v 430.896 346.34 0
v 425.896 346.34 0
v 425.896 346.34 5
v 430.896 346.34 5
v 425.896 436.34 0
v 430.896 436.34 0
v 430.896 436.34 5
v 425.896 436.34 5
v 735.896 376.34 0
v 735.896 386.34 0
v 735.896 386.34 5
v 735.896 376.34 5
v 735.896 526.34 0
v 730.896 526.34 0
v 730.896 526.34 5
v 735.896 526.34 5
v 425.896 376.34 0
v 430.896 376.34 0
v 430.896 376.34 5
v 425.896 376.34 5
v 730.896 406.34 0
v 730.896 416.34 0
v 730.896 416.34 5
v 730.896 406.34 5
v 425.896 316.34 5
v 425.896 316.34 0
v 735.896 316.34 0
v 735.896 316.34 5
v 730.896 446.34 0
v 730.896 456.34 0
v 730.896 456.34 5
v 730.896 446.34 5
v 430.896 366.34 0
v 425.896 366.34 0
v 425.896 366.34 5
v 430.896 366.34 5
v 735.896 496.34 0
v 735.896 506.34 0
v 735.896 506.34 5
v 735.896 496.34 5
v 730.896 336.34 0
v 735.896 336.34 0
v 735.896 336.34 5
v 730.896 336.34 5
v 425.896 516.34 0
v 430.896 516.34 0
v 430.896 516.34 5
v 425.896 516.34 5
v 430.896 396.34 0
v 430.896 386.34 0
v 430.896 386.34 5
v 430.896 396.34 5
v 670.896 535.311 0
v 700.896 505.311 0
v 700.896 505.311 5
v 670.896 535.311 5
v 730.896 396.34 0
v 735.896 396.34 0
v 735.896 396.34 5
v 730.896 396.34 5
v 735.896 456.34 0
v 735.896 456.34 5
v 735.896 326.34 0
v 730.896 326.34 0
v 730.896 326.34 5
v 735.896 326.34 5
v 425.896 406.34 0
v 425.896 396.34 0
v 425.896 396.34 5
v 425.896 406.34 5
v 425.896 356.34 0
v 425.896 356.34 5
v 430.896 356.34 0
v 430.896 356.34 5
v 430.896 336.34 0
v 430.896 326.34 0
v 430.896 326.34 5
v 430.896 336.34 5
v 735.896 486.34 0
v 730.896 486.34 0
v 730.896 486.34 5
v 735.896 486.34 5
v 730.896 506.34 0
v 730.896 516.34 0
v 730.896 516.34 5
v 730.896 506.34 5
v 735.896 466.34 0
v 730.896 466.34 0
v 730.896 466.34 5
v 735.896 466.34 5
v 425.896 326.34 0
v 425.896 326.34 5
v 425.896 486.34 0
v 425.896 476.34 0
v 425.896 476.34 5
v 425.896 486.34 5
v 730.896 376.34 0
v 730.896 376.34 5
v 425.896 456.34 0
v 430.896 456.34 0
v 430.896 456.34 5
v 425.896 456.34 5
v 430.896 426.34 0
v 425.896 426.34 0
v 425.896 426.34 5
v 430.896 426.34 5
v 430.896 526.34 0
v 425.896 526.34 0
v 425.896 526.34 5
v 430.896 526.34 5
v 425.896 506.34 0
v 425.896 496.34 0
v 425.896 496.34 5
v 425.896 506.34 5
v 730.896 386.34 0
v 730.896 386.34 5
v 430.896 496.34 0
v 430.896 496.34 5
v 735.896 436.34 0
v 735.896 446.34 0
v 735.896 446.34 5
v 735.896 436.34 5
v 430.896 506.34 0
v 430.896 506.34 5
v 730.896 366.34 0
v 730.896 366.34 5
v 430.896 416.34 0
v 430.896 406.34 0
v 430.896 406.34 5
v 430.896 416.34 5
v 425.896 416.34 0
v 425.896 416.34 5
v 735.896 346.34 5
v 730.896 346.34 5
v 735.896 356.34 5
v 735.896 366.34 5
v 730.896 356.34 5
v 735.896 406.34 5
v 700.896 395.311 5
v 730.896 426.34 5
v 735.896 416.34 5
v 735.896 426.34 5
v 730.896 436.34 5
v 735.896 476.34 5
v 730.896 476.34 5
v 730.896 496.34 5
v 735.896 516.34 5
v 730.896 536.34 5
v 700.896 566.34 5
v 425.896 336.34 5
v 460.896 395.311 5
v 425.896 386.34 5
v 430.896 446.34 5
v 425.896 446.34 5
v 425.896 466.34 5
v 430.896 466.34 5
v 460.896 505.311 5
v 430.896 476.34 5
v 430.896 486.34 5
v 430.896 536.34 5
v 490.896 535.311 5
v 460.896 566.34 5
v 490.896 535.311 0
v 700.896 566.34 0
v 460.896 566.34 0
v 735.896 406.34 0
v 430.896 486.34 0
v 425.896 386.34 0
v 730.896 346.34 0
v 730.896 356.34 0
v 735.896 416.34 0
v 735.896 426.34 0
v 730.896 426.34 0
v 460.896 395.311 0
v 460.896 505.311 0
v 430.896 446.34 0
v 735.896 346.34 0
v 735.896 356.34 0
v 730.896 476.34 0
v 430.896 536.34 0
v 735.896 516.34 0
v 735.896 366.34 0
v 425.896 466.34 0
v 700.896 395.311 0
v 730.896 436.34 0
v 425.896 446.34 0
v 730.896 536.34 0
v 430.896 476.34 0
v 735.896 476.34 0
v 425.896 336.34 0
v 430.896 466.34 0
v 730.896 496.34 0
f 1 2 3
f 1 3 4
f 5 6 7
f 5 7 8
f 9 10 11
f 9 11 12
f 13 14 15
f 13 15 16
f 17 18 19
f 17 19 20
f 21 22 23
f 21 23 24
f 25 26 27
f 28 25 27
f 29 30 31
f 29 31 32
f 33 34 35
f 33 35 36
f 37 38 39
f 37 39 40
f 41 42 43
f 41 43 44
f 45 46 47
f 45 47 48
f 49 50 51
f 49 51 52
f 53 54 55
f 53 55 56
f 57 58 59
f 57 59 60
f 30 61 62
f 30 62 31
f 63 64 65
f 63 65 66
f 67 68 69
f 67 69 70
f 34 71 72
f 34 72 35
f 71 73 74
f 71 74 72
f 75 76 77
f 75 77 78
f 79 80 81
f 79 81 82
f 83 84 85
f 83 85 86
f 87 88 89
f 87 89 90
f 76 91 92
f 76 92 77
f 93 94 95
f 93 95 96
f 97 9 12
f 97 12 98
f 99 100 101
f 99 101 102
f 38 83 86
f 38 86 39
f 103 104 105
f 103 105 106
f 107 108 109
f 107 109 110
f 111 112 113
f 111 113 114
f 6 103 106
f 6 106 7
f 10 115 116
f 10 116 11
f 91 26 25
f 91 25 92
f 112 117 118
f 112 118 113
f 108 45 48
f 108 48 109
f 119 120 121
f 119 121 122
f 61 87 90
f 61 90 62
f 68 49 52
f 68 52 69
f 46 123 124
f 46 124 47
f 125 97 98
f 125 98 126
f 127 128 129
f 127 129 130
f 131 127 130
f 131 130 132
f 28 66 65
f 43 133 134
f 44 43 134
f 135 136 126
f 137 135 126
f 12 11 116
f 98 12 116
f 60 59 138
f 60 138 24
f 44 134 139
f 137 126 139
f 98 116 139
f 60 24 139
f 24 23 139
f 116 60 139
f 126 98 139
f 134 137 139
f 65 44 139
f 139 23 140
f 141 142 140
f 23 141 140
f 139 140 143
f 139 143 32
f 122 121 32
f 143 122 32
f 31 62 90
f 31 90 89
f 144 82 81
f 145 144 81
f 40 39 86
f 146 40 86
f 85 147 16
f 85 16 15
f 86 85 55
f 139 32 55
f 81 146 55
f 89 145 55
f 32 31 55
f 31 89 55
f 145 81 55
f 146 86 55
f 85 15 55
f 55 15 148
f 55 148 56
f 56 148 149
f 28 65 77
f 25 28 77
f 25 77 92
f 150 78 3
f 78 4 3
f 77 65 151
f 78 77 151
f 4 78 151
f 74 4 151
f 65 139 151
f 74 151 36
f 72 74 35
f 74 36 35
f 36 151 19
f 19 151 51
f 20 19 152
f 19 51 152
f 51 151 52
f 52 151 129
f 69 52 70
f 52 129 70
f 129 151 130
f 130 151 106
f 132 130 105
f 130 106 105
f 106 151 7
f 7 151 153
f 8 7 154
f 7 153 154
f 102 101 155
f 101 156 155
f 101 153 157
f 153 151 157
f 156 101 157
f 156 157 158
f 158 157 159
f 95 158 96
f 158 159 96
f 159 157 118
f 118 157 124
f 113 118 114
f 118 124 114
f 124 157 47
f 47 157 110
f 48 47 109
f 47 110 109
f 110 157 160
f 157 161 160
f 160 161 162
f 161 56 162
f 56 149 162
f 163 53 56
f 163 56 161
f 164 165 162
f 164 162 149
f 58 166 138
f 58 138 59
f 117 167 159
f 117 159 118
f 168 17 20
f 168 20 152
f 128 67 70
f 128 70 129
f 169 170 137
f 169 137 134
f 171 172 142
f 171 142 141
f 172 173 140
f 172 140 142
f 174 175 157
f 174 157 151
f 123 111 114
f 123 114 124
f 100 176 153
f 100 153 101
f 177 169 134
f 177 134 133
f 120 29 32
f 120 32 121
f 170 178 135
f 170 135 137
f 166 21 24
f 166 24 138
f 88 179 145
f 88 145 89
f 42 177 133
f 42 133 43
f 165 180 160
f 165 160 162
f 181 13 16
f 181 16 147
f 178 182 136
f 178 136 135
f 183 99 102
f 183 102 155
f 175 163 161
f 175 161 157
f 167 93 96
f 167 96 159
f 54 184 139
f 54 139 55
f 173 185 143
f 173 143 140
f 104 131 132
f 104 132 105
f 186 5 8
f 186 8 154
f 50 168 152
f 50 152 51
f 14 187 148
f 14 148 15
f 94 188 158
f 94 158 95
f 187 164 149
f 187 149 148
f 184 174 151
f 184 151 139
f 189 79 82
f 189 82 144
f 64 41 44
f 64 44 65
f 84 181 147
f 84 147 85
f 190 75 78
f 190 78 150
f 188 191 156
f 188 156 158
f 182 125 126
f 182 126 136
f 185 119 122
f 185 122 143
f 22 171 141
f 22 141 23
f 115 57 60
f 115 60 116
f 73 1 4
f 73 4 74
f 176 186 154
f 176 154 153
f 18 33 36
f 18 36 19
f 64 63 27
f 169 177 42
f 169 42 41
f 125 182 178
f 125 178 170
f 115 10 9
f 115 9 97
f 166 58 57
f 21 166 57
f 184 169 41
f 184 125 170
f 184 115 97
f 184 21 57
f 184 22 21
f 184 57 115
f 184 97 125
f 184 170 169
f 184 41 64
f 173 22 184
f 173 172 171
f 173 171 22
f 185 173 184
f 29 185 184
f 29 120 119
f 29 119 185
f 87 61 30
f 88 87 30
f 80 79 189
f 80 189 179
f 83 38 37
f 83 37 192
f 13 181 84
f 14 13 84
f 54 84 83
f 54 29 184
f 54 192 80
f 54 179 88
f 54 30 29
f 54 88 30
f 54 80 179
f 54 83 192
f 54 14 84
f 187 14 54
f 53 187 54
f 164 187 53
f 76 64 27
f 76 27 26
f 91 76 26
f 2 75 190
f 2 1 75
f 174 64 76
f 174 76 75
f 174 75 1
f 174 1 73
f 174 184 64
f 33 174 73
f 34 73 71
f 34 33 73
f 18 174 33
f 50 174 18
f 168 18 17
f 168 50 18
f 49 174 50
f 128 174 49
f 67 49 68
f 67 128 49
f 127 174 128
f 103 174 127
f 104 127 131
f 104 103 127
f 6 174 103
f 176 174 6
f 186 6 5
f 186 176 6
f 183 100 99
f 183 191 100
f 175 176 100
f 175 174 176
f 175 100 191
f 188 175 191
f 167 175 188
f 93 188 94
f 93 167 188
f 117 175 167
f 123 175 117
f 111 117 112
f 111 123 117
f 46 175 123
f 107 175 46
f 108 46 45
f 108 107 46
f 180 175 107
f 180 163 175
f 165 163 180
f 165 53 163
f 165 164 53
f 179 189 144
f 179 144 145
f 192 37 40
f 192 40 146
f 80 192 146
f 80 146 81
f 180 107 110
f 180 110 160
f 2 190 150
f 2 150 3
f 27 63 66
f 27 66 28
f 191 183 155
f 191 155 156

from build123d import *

# Parameters (mm, degrees)
AUFSATZ_LINEAR_AUSTRAGEN1_DEPTH = 5


with BuildPart() as part:
    # Skizze1 → Aufsatz-Linear austragen1 (new body)
    with BuildSketch(Plane.XY):
        Polygon((430.89618142, 326.340211581), (430.89618142, 336.340211581), (425.89618142, 336.340211581), (425.89618142, 346.340211581), (430.89618142, 346.340211581), (430.89618142, 356.340211581), (425.89618142, 356.340211581), (425.89618142, 366.340211581), (430.89618142, 366.340211581), (430.89618142, 376.340211581), (425.89618142, 376.340211581), (425.89618142, 386.340211581), (430.89618142, 386.340211581), (430.89618142, 396.340211581), (425.89618142, 396.340211581), (425.89618142, 406.340211581), (430.89618142, 406.340211581), (430.89618142, 416.340211581), (425.89618142, 416.340211581), (425.89618142, 426.340211581), (430.89618142, 426.340211581), (430.89618142, 436.340211581), (425.89618142, 436.340211581), (425.89618142, 446.340211581), (430.89618142, 446.340211581), (430.89618142, 456.340211581), (425.89618142, 456.340211581), (425.89618142, 466.340211581), (430.89618142, 466.340211581), (430.89618142, 476.340211581), (425.89618142, 476.340211581), (425.89618142, 486.340211581), (430.89618142, 486.340211581), (430.89618142, 496.340211581), (425.89618142, 496.340211581), (425.89618142, 506.340211581), (430.89618142, 506.340211581), (430.89618142, 516.340211581), (425.89618142, 516.340211581), (425.89618142, 526.340211581), (430.89618142, 526.340211581), (430.89618142, 536.340211581), (460.89618142, 566.340211581), (700.89618142, 566.340211581), (730.89618142, 536.340211581), (730.89618142, 526.340211581), (735.89618142, 526.340211581), (735.89618142, 516.340211581), (730.89618142, 516.340211581), (730.89618142, 506.340211581), (735.89618142, 506.340211581), (735.89618142, 496.340211581), (730.89618142, 496.340211581), (730.89618142, 486.340211581), (735.89618142, 486.340211581), (735.89618142, 476.340211581), (730.89618142, 476.340211581), (730.89618142, 466.340211581), (735.89618142, 466.340211581), (735.89618142, 456.340211581), (730.89618142, 456.340211581), (730.89618142, 446.340211581), (735.89618142, 446.340211581), (735.89618142, 436.340211581), (730.89618142, 436.340211581), (730.89618142, 426.340211581), (735.89618142, 426.340211581), (735.89618142, 416.340211581), (730.89618142, 416.340211581), (730.89618142, 406.340211581), (735.89618142, 406.340211581), (735.89618142, 396.340211581), (730.89618142, 396.340211581), (730.89618142, 386.340211581), (735.89618142, 386.340211581), (735.89618142, 376.340211581), (730.89618142, 376.340211581), (730.89618142, 366.340211581), (735.89618142, 366.340211581), (735.89618142, 356.340211581), (730.89618142, 356.340211581), (730.89618142, 346.340211581), (735.89618142, 346.340211581), (735.89618142, 336.340211581), (730.89618142, 336.340211581), (730.89618142, 326.340211581), (735.89618142, 326.340211581), (735.89618142, 316.340211581), (730.89618142, 316.340211581), (430.89618142, 316.340211581), (425.89618142, 316.340211581), (425.89618142, 326.340211581), align=None)
        Polygon((700.89618142, 505.311376979), (670.89618142, 535.311376979), (490.89618142, 535.311376979), (460.89618142, 505.311376979), (460.89618142, 395.311376979), (700.89618142, 395.311376979), align=None, mode=Mode.SUBTRACT)
    extrude(amount=AUFSATZ_LINEAR_AUSTRAGEN1_DEPTH)


solid = part.part
